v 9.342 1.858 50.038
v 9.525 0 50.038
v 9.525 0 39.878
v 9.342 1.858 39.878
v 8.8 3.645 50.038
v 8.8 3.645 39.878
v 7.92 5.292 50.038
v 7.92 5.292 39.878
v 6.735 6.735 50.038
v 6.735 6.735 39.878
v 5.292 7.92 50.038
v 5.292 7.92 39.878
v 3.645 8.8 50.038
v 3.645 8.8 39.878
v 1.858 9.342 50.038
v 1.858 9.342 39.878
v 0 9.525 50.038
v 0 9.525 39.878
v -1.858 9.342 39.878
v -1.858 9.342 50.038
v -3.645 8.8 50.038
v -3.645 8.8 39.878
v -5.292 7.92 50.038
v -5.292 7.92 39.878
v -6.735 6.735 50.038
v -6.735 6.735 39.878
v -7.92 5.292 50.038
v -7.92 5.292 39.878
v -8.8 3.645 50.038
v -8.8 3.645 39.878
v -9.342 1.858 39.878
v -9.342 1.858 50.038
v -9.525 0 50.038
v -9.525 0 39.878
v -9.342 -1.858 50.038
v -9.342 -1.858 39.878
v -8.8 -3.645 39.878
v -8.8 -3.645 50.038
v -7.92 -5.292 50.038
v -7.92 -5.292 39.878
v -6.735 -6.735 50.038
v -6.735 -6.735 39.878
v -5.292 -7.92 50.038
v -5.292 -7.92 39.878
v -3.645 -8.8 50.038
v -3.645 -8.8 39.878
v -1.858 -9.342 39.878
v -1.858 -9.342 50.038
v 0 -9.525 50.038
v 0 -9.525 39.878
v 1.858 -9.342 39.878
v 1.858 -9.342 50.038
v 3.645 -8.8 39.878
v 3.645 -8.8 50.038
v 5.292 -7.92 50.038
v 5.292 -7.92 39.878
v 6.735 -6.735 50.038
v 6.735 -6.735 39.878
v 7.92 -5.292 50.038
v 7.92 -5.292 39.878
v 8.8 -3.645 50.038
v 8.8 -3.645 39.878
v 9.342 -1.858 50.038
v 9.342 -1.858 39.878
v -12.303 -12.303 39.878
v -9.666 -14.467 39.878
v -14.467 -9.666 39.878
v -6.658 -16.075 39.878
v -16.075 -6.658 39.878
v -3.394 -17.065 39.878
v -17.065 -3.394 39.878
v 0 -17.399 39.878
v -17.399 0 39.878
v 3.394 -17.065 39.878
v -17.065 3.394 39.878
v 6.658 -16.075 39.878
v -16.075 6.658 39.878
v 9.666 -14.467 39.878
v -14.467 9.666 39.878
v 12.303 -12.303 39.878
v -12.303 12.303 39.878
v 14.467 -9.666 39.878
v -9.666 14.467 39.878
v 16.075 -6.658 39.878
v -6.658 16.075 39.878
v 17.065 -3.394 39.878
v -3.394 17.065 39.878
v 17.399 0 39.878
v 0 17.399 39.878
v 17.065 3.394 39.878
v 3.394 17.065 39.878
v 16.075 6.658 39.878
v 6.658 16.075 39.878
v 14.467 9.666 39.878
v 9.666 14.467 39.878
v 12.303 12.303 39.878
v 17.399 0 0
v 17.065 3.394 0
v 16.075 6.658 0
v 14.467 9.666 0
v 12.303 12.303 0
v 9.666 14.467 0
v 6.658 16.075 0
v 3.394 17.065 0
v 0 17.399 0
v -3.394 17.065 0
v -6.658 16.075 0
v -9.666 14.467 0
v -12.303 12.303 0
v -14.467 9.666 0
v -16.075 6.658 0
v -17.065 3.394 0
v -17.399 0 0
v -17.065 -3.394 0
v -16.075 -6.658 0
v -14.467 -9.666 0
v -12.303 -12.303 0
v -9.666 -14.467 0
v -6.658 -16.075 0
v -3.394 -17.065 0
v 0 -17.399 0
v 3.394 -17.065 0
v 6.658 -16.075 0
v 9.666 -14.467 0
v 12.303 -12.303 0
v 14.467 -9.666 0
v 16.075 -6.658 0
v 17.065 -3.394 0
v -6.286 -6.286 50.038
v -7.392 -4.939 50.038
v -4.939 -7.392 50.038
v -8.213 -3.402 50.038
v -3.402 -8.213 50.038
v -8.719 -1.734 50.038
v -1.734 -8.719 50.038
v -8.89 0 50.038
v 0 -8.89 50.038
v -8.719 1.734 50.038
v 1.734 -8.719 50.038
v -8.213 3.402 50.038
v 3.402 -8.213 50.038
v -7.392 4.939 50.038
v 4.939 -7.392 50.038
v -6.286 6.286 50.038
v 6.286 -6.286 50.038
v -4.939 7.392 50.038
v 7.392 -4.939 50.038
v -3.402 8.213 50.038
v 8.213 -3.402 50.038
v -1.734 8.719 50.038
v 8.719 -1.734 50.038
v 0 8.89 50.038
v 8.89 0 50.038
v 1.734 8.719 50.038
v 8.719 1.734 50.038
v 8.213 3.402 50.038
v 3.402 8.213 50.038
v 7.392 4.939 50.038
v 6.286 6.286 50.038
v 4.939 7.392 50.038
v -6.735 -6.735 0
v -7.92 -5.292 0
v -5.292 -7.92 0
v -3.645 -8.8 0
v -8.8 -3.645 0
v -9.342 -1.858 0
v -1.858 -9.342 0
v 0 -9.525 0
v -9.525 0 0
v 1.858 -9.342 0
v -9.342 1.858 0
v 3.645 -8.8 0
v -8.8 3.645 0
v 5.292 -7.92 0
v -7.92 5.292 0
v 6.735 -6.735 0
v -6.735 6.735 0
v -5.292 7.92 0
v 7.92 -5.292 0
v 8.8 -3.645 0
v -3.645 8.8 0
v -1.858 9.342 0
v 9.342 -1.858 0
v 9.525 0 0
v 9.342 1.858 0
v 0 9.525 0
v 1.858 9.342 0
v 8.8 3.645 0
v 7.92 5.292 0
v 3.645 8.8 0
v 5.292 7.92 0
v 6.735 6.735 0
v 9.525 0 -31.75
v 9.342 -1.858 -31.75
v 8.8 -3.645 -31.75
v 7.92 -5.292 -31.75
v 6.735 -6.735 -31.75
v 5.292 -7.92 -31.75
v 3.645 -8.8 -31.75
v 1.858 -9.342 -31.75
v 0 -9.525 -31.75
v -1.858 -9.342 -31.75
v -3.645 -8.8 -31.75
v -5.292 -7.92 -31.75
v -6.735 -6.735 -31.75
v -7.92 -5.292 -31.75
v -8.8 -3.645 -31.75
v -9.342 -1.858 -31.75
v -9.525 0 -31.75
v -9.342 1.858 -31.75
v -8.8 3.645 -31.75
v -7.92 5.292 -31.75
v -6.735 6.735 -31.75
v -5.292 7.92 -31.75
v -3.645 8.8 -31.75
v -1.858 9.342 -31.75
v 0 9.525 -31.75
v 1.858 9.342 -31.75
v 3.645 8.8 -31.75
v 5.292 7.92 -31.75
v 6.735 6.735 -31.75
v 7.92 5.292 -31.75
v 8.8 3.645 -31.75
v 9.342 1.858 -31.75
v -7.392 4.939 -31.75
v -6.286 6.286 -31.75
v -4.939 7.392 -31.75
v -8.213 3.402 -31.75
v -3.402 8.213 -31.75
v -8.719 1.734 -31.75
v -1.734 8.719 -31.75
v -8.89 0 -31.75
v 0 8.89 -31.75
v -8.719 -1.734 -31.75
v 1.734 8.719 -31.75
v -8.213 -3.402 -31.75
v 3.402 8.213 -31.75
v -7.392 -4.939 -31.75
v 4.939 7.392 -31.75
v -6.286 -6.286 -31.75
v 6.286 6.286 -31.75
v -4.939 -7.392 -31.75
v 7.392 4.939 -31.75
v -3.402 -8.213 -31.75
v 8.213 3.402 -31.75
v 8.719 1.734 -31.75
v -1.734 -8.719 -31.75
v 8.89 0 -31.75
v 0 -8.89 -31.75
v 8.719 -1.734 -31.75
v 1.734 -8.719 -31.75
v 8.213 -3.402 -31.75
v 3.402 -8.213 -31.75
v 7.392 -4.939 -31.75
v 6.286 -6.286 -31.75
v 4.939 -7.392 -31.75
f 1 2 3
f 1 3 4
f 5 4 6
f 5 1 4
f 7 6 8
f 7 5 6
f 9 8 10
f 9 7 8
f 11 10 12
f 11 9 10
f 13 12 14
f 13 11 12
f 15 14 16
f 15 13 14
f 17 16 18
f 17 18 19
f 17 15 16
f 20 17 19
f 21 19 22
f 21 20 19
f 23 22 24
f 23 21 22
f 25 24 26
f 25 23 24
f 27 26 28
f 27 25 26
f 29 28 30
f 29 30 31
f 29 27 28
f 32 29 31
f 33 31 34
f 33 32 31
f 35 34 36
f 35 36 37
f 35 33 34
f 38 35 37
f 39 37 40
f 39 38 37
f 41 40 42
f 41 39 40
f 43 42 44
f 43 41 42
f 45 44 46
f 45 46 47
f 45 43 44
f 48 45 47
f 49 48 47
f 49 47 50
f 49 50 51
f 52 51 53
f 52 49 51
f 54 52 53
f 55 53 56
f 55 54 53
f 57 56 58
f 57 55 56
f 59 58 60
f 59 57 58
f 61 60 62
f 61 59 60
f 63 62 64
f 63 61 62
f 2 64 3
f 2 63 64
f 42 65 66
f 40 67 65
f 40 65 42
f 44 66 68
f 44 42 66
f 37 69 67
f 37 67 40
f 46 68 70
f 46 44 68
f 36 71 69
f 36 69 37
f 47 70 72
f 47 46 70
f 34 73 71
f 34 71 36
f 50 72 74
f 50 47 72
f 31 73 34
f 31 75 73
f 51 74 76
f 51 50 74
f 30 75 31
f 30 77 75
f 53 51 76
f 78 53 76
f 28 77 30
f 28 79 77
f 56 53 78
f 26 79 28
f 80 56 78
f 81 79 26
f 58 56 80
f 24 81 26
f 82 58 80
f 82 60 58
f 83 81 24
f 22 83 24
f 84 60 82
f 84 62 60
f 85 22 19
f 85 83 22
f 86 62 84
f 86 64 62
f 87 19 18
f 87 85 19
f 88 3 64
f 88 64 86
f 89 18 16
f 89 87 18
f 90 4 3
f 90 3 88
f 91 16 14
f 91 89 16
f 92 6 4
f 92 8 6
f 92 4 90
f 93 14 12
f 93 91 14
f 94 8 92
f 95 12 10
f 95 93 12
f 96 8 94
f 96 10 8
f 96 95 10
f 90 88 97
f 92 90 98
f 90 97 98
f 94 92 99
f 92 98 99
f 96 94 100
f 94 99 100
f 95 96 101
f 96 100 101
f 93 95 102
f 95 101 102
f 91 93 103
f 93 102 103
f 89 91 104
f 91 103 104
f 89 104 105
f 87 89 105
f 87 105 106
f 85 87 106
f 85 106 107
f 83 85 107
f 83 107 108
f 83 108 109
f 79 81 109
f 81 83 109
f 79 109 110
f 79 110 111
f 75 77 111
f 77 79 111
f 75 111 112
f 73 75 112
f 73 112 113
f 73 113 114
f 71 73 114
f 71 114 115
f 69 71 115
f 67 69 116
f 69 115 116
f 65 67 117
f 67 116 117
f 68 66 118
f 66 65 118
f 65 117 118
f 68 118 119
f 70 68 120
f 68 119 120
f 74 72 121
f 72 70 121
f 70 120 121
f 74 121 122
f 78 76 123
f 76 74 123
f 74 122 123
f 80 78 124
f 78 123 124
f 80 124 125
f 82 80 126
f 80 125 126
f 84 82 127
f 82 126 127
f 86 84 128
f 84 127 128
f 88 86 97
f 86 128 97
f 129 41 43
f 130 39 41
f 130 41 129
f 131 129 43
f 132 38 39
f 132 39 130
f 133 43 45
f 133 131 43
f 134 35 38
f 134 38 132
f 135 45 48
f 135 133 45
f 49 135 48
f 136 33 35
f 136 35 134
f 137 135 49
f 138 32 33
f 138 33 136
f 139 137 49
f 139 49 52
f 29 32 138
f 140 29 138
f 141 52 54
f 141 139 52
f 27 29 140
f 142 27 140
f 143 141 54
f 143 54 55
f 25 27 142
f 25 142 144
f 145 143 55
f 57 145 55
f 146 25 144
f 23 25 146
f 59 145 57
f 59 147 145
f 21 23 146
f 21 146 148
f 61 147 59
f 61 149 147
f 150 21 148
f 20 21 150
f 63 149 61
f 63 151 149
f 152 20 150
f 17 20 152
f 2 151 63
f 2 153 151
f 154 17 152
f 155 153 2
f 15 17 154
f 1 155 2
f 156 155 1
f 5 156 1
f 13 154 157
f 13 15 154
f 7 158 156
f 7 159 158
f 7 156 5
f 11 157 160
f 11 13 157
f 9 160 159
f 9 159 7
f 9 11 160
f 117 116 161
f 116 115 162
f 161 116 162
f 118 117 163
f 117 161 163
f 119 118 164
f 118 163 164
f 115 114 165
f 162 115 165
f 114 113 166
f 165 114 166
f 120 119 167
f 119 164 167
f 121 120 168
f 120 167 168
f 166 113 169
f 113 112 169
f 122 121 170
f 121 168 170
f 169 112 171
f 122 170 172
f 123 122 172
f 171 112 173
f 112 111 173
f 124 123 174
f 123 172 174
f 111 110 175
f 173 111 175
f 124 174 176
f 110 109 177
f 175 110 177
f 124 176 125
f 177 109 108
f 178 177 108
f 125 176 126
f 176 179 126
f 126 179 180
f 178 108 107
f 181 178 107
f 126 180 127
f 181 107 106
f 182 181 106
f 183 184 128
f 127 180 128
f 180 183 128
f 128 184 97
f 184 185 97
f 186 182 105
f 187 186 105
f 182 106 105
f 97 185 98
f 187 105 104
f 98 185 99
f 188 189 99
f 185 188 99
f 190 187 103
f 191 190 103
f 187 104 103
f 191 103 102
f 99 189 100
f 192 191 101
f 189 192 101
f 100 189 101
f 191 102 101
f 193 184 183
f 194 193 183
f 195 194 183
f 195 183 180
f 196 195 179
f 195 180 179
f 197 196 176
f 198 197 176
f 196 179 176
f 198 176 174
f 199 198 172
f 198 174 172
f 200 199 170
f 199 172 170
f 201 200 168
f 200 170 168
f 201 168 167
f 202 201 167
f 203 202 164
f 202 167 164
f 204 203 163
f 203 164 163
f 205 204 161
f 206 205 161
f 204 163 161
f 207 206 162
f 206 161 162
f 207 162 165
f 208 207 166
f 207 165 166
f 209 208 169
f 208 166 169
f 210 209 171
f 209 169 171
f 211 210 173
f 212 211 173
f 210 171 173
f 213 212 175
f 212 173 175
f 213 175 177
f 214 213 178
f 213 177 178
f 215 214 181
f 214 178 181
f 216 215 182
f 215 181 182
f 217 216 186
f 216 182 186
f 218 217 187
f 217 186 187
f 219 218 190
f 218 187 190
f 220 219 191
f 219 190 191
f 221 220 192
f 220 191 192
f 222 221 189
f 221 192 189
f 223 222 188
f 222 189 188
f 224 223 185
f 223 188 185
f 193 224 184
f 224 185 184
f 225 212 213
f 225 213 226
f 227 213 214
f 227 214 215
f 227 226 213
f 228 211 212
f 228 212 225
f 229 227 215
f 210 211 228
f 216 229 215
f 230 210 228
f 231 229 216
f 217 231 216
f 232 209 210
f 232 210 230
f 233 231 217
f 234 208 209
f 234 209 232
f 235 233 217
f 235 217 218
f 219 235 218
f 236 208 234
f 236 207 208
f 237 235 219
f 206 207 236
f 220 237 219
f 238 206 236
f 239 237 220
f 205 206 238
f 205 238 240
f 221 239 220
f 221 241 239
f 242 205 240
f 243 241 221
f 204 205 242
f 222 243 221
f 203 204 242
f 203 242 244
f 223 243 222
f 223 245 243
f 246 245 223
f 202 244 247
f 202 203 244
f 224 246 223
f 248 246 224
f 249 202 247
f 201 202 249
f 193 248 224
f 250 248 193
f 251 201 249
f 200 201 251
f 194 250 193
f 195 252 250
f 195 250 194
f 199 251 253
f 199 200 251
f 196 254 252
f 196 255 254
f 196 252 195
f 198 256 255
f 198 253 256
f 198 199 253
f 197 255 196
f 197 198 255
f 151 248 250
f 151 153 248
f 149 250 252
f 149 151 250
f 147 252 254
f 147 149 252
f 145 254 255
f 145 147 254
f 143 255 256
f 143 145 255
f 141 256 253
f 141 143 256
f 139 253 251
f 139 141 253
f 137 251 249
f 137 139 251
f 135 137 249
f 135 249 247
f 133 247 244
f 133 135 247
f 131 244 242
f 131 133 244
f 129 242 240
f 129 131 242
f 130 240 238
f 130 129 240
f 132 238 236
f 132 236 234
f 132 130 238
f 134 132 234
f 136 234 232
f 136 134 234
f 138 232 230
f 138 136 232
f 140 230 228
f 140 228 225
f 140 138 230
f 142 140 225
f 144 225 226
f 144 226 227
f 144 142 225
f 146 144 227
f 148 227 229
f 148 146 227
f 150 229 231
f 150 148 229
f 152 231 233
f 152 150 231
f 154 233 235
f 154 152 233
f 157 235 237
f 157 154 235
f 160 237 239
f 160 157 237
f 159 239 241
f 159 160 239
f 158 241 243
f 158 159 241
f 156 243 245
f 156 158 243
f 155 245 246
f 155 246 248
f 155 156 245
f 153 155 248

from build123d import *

# Parameters (mm, degrees)
SKETCH1_R           = 17.399
BOSS_EXTRUDE1_DEPTH = 50.038
SKETCH3_R           = 38.1
SKETCH3_R_2         = 9.525
CUT_EXTRUDE1_DEPTH  = 10.16
SKETCH4_R           = 8.89
CUT_EXTRUDE2_DEPTH  = 127
SKETCH5_R           = 9.525
SKETCH5_R_2         = 8.89
BOSS_EXTRUDE2_DEPTH = 31.75


with BuildPart() as part:
    # Sketch1 → Boss-Extrude1 (new body)
    with BuildSketch(Plane.XY):
        Circle(SKETCH1_R)
    extrude(amount=BOSS_EXTRUDE1_DEPTH)

    # Sketch3 → Cut-Extrude1 (cut)
    with BuildSketch(Plane.XY.offset(50.038)):
        Circle(SKETCH3_R)
        Circle(SKETCH3_R_2, mode=Mode.SUBTRACT)
    extrude(amount=-CUT_EXTRUDE1_DEPTH, mode=Mode.SUBTRACT)

    # Sketch4 → Cut-Extrude2 (cut)
    with BuildSketch(Plane.XY.offset(50.038)):
        Circle(SKETCH4_R)
    extrude(amount=-CUT_EXTRUDE2_DEPTH, mode=Mode.SUBTRACT)

    # Sketch5 → Boss-Extrude2 (add)
    with BuildSketch(Plane(origin=(0, 0, 0), x_dir=(-1, 0, 0), z_dir=(0, 0, -1))):
        with Locations(Location((0, 0, 0), (0, 0, 180))):
            Circle(SKETCH5_R)
        with Locations(Location((0, 0, 0), (0, 0, 180))):
            Circle(SKETCH5_R_2, mode=Mode.SUBTRACT)
    extrude(amount=BOSS_EXTRUDE2_DEPTH)


solid = part.part
